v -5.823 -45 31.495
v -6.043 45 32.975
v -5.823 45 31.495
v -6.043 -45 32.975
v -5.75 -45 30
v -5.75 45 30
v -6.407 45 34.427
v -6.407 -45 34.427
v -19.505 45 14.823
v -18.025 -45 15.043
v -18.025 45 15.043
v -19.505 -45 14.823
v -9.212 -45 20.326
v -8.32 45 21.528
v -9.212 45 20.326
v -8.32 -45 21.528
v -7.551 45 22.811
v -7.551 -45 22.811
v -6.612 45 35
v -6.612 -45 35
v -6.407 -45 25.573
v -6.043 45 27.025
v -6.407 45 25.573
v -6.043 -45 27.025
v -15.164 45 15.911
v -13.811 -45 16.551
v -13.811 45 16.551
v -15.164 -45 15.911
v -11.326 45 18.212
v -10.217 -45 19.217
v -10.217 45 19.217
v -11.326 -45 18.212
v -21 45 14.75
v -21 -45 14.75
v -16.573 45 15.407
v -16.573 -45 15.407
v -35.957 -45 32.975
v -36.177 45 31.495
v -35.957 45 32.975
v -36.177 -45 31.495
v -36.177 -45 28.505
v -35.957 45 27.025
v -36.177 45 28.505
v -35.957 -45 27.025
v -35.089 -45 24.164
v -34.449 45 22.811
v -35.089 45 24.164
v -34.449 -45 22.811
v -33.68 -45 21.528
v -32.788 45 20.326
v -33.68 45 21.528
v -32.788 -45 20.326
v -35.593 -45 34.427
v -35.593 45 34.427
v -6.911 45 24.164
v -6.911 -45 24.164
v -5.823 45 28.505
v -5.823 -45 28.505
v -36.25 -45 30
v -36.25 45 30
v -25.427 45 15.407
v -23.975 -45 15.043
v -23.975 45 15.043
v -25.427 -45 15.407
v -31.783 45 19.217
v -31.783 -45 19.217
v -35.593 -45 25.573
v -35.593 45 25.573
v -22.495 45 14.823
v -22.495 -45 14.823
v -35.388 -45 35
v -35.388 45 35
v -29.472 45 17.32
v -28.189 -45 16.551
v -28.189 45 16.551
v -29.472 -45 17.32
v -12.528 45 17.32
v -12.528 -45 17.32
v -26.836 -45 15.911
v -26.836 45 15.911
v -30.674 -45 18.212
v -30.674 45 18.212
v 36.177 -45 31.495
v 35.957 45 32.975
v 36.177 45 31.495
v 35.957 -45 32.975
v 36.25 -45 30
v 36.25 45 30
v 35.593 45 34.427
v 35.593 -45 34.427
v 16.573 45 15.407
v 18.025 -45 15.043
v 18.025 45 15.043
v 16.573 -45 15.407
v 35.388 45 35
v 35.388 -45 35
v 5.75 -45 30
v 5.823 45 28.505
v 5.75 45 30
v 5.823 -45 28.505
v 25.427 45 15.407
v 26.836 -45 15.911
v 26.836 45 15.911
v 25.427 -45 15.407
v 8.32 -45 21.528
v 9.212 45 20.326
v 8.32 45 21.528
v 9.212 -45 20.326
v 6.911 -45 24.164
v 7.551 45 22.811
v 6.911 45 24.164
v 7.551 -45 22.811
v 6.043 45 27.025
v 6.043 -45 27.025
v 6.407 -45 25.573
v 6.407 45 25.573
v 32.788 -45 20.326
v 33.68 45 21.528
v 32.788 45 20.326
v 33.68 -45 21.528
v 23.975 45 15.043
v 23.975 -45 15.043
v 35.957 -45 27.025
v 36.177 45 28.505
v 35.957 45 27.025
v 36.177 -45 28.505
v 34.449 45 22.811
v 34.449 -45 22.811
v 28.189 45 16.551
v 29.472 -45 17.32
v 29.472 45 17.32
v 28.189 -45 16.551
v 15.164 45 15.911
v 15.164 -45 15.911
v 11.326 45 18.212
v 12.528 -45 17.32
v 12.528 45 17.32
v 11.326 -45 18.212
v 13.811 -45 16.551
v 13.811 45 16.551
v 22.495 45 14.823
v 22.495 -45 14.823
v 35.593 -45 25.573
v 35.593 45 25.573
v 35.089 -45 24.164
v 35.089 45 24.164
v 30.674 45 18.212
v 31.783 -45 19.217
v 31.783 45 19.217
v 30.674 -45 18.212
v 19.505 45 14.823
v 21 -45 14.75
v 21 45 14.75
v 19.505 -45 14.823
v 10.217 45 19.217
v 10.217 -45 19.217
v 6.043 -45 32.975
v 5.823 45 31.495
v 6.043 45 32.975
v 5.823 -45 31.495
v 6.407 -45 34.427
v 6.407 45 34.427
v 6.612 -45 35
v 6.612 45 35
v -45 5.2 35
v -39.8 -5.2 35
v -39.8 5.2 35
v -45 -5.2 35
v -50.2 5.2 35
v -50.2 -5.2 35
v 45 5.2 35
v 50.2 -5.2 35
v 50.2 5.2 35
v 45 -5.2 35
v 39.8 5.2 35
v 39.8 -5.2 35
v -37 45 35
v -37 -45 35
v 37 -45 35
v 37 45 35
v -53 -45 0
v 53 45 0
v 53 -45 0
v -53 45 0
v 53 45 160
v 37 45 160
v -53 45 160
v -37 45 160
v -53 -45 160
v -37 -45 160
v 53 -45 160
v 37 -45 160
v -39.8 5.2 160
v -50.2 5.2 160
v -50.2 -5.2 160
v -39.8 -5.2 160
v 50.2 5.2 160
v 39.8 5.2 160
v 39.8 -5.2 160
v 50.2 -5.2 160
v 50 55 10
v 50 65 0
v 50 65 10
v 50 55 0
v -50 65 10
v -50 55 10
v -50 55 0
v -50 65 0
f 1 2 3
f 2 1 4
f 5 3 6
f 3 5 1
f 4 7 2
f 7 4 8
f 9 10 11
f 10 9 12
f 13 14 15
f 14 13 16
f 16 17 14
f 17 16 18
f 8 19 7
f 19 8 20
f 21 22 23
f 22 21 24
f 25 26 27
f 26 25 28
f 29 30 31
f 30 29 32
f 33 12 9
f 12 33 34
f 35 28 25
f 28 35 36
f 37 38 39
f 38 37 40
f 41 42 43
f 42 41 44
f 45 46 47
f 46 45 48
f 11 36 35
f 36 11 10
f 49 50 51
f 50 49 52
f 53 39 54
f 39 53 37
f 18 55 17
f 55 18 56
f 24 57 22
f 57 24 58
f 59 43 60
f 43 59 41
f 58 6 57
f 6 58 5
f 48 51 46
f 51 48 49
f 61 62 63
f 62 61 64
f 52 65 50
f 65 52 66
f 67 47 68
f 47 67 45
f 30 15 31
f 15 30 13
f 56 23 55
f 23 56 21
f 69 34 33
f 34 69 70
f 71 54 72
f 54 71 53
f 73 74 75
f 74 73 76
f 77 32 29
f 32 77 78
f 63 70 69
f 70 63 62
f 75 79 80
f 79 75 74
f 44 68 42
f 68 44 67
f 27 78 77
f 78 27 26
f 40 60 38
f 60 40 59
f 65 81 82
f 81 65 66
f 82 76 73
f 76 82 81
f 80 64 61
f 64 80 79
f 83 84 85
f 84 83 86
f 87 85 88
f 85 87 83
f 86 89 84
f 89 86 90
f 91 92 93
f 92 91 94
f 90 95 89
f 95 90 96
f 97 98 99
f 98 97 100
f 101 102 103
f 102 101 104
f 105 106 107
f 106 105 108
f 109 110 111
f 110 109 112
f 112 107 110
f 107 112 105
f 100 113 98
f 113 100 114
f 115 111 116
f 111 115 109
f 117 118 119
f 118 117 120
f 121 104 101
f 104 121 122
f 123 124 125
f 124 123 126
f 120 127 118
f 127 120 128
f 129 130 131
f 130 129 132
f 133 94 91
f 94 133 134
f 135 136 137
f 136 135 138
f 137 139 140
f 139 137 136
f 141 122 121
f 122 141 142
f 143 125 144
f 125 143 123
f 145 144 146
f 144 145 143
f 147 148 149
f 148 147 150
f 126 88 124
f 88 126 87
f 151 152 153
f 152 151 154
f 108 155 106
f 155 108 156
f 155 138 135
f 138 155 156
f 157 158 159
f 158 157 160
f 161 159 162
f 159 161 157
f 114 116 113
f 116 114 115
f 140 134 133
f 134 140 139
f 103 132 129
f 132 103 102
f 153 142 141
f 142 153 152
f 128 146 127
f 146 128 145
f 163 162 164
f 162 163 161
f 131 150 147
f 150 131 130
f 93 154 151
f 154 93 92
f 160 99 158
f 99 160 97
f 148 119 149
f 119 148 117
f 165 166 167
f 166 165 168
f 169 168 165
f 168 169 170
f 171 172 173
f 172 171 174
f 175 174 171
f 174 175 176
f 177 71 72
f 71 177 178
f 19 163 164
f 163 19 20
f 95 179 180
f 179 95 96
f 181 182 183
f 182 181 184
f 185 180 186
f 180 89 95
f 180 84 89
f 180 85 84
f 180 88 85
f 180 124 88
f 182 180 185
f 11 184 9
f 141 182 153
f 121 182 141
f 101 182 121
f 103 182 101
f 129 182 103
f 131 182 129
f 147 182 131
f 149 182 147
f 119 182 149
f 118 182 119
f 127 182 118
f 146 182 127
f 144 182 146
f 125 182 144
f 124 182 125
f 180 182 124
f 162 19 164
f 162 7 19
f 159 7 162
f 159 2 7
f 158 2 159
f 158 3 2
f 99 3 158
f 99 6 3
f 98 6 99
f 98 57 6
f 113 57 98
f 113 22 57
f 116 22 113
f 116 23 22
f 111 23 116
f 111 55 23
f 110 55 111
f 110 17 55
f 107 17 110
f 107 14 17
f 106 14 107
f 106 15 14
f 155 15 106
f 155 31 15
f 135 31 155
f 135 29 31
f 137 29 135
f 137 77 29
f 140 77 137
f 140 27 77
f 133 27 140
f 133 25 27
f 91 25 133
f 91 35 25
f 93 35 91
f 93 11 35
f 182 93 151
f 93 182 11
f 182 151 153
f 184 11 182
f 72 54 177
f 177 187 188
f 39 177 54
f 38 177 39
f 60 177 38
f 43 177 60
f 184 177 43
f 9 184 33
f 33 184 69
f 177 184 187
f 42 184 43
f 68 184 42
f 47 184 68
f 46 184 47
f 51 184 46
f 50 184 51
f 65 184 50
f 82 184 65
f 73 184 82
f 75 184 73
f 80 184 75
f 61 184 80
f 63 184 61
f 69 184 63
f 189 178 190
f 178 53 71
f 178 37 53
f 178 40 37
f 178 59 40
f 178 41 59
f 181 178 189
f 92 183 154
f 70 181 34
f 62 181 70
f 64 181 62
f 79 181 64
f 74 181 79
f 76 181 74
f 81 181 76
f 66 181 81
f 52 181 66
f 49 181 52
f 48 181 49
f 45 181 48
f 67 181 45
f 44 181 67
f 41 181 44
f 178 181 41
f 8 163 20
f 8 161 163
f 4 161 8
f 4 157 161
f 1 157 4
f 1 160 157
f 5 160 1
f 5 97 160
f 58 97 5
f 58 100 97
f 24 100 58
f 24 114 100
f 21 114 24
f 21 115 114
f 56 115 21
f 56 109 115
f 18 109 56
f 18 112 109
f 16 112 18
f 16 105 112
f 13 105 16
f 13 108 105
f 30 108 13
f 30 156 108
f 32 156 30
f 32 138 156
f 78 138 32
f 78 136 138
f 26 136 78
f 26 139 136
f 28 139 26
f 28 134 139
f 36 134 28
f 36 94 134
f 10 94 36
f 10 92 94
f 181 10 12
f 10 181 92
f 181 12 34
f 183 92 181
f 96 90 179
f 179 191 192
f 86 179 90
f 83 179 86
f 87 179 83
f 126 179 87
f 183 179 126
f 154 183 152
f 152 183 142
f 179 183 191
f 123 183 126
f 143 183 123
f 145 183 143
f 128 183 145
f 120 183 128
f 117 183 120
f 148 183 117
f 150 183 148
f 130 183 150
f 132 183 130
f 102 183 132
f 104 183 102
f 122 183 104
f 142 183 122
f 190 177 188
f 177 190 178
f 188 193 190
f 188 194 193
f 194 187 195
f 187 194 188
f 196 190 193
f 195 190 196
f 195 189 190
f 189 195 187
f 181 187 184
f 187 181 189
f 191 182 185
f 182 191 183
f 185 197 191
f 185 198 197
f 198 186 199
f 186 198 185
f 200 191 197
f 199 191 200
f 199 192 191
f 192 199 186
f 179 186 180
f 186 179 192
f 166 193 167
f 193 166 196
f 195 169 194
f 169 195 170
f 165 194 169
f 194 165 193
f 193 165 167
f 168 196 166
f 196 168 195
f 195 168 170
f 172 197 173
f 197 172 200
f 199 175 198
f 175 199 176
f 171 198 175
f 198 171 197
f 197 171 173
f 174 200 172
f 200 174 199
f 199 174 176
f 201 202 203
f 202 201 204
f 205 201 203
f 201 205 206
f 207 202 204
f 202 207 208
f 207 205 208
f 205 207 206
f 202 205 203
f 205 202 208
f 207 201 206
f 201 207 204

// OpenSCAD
// Built by bench/smallmodels/features/compiler.py from a list of features.
$fn = 64;
difference() {
  union() {
    translate([0, 0, 0]) translate([-45, -45, 0]) cube([90, 90, 35]);
  }
  union() {
    translate([-21, -24, 30]) rotate([0, 0, 0]) rotate([90, 0, 0]) cylinder(d = 30.5, h = 1140, center = true);
    translate([-21, 24, 30]) rotate([0, 0, 0]) rotate([90, 0, 0]) cylinder(d = 30.5, h = 1140, center = true);
    translate([21, -24, 30]) rotate([0, 0, 0]) rotate([90, 0, 0]) cylinder(d = 30.5, h = 1140, center = true);
    translate([21, 24, 30]) rotate([0, 0, 0]) rotate([90, 0, 0]) cylinder(d = 30.5, h = 1140, center = true);
  }
}
difference() {
  union() {
    translate([-45, 0, 0]) translate([-8, -45, 0]) cube([16, 90, 160]);
    translate([45, 0, 0]) translate([-8, -45, 0]) cube([16, 90, 160]);
  }
  union() {
    translate([-45, 0, 35]) rotate([0, 0, 0]) translate([-5.2, -5.2, 0]) cube([10.4, 10.4, 150]);
    translate([45, 0, 35]) rotate([0, 0, 0]) translate([-5.2, -5.2, 0]) cube([10.4, 10.4, 150]);
  }
}
union() {
    translate([0, 60, 0]) translate([-50, -5, 0]) cube([100, 10, 10]);
  }
